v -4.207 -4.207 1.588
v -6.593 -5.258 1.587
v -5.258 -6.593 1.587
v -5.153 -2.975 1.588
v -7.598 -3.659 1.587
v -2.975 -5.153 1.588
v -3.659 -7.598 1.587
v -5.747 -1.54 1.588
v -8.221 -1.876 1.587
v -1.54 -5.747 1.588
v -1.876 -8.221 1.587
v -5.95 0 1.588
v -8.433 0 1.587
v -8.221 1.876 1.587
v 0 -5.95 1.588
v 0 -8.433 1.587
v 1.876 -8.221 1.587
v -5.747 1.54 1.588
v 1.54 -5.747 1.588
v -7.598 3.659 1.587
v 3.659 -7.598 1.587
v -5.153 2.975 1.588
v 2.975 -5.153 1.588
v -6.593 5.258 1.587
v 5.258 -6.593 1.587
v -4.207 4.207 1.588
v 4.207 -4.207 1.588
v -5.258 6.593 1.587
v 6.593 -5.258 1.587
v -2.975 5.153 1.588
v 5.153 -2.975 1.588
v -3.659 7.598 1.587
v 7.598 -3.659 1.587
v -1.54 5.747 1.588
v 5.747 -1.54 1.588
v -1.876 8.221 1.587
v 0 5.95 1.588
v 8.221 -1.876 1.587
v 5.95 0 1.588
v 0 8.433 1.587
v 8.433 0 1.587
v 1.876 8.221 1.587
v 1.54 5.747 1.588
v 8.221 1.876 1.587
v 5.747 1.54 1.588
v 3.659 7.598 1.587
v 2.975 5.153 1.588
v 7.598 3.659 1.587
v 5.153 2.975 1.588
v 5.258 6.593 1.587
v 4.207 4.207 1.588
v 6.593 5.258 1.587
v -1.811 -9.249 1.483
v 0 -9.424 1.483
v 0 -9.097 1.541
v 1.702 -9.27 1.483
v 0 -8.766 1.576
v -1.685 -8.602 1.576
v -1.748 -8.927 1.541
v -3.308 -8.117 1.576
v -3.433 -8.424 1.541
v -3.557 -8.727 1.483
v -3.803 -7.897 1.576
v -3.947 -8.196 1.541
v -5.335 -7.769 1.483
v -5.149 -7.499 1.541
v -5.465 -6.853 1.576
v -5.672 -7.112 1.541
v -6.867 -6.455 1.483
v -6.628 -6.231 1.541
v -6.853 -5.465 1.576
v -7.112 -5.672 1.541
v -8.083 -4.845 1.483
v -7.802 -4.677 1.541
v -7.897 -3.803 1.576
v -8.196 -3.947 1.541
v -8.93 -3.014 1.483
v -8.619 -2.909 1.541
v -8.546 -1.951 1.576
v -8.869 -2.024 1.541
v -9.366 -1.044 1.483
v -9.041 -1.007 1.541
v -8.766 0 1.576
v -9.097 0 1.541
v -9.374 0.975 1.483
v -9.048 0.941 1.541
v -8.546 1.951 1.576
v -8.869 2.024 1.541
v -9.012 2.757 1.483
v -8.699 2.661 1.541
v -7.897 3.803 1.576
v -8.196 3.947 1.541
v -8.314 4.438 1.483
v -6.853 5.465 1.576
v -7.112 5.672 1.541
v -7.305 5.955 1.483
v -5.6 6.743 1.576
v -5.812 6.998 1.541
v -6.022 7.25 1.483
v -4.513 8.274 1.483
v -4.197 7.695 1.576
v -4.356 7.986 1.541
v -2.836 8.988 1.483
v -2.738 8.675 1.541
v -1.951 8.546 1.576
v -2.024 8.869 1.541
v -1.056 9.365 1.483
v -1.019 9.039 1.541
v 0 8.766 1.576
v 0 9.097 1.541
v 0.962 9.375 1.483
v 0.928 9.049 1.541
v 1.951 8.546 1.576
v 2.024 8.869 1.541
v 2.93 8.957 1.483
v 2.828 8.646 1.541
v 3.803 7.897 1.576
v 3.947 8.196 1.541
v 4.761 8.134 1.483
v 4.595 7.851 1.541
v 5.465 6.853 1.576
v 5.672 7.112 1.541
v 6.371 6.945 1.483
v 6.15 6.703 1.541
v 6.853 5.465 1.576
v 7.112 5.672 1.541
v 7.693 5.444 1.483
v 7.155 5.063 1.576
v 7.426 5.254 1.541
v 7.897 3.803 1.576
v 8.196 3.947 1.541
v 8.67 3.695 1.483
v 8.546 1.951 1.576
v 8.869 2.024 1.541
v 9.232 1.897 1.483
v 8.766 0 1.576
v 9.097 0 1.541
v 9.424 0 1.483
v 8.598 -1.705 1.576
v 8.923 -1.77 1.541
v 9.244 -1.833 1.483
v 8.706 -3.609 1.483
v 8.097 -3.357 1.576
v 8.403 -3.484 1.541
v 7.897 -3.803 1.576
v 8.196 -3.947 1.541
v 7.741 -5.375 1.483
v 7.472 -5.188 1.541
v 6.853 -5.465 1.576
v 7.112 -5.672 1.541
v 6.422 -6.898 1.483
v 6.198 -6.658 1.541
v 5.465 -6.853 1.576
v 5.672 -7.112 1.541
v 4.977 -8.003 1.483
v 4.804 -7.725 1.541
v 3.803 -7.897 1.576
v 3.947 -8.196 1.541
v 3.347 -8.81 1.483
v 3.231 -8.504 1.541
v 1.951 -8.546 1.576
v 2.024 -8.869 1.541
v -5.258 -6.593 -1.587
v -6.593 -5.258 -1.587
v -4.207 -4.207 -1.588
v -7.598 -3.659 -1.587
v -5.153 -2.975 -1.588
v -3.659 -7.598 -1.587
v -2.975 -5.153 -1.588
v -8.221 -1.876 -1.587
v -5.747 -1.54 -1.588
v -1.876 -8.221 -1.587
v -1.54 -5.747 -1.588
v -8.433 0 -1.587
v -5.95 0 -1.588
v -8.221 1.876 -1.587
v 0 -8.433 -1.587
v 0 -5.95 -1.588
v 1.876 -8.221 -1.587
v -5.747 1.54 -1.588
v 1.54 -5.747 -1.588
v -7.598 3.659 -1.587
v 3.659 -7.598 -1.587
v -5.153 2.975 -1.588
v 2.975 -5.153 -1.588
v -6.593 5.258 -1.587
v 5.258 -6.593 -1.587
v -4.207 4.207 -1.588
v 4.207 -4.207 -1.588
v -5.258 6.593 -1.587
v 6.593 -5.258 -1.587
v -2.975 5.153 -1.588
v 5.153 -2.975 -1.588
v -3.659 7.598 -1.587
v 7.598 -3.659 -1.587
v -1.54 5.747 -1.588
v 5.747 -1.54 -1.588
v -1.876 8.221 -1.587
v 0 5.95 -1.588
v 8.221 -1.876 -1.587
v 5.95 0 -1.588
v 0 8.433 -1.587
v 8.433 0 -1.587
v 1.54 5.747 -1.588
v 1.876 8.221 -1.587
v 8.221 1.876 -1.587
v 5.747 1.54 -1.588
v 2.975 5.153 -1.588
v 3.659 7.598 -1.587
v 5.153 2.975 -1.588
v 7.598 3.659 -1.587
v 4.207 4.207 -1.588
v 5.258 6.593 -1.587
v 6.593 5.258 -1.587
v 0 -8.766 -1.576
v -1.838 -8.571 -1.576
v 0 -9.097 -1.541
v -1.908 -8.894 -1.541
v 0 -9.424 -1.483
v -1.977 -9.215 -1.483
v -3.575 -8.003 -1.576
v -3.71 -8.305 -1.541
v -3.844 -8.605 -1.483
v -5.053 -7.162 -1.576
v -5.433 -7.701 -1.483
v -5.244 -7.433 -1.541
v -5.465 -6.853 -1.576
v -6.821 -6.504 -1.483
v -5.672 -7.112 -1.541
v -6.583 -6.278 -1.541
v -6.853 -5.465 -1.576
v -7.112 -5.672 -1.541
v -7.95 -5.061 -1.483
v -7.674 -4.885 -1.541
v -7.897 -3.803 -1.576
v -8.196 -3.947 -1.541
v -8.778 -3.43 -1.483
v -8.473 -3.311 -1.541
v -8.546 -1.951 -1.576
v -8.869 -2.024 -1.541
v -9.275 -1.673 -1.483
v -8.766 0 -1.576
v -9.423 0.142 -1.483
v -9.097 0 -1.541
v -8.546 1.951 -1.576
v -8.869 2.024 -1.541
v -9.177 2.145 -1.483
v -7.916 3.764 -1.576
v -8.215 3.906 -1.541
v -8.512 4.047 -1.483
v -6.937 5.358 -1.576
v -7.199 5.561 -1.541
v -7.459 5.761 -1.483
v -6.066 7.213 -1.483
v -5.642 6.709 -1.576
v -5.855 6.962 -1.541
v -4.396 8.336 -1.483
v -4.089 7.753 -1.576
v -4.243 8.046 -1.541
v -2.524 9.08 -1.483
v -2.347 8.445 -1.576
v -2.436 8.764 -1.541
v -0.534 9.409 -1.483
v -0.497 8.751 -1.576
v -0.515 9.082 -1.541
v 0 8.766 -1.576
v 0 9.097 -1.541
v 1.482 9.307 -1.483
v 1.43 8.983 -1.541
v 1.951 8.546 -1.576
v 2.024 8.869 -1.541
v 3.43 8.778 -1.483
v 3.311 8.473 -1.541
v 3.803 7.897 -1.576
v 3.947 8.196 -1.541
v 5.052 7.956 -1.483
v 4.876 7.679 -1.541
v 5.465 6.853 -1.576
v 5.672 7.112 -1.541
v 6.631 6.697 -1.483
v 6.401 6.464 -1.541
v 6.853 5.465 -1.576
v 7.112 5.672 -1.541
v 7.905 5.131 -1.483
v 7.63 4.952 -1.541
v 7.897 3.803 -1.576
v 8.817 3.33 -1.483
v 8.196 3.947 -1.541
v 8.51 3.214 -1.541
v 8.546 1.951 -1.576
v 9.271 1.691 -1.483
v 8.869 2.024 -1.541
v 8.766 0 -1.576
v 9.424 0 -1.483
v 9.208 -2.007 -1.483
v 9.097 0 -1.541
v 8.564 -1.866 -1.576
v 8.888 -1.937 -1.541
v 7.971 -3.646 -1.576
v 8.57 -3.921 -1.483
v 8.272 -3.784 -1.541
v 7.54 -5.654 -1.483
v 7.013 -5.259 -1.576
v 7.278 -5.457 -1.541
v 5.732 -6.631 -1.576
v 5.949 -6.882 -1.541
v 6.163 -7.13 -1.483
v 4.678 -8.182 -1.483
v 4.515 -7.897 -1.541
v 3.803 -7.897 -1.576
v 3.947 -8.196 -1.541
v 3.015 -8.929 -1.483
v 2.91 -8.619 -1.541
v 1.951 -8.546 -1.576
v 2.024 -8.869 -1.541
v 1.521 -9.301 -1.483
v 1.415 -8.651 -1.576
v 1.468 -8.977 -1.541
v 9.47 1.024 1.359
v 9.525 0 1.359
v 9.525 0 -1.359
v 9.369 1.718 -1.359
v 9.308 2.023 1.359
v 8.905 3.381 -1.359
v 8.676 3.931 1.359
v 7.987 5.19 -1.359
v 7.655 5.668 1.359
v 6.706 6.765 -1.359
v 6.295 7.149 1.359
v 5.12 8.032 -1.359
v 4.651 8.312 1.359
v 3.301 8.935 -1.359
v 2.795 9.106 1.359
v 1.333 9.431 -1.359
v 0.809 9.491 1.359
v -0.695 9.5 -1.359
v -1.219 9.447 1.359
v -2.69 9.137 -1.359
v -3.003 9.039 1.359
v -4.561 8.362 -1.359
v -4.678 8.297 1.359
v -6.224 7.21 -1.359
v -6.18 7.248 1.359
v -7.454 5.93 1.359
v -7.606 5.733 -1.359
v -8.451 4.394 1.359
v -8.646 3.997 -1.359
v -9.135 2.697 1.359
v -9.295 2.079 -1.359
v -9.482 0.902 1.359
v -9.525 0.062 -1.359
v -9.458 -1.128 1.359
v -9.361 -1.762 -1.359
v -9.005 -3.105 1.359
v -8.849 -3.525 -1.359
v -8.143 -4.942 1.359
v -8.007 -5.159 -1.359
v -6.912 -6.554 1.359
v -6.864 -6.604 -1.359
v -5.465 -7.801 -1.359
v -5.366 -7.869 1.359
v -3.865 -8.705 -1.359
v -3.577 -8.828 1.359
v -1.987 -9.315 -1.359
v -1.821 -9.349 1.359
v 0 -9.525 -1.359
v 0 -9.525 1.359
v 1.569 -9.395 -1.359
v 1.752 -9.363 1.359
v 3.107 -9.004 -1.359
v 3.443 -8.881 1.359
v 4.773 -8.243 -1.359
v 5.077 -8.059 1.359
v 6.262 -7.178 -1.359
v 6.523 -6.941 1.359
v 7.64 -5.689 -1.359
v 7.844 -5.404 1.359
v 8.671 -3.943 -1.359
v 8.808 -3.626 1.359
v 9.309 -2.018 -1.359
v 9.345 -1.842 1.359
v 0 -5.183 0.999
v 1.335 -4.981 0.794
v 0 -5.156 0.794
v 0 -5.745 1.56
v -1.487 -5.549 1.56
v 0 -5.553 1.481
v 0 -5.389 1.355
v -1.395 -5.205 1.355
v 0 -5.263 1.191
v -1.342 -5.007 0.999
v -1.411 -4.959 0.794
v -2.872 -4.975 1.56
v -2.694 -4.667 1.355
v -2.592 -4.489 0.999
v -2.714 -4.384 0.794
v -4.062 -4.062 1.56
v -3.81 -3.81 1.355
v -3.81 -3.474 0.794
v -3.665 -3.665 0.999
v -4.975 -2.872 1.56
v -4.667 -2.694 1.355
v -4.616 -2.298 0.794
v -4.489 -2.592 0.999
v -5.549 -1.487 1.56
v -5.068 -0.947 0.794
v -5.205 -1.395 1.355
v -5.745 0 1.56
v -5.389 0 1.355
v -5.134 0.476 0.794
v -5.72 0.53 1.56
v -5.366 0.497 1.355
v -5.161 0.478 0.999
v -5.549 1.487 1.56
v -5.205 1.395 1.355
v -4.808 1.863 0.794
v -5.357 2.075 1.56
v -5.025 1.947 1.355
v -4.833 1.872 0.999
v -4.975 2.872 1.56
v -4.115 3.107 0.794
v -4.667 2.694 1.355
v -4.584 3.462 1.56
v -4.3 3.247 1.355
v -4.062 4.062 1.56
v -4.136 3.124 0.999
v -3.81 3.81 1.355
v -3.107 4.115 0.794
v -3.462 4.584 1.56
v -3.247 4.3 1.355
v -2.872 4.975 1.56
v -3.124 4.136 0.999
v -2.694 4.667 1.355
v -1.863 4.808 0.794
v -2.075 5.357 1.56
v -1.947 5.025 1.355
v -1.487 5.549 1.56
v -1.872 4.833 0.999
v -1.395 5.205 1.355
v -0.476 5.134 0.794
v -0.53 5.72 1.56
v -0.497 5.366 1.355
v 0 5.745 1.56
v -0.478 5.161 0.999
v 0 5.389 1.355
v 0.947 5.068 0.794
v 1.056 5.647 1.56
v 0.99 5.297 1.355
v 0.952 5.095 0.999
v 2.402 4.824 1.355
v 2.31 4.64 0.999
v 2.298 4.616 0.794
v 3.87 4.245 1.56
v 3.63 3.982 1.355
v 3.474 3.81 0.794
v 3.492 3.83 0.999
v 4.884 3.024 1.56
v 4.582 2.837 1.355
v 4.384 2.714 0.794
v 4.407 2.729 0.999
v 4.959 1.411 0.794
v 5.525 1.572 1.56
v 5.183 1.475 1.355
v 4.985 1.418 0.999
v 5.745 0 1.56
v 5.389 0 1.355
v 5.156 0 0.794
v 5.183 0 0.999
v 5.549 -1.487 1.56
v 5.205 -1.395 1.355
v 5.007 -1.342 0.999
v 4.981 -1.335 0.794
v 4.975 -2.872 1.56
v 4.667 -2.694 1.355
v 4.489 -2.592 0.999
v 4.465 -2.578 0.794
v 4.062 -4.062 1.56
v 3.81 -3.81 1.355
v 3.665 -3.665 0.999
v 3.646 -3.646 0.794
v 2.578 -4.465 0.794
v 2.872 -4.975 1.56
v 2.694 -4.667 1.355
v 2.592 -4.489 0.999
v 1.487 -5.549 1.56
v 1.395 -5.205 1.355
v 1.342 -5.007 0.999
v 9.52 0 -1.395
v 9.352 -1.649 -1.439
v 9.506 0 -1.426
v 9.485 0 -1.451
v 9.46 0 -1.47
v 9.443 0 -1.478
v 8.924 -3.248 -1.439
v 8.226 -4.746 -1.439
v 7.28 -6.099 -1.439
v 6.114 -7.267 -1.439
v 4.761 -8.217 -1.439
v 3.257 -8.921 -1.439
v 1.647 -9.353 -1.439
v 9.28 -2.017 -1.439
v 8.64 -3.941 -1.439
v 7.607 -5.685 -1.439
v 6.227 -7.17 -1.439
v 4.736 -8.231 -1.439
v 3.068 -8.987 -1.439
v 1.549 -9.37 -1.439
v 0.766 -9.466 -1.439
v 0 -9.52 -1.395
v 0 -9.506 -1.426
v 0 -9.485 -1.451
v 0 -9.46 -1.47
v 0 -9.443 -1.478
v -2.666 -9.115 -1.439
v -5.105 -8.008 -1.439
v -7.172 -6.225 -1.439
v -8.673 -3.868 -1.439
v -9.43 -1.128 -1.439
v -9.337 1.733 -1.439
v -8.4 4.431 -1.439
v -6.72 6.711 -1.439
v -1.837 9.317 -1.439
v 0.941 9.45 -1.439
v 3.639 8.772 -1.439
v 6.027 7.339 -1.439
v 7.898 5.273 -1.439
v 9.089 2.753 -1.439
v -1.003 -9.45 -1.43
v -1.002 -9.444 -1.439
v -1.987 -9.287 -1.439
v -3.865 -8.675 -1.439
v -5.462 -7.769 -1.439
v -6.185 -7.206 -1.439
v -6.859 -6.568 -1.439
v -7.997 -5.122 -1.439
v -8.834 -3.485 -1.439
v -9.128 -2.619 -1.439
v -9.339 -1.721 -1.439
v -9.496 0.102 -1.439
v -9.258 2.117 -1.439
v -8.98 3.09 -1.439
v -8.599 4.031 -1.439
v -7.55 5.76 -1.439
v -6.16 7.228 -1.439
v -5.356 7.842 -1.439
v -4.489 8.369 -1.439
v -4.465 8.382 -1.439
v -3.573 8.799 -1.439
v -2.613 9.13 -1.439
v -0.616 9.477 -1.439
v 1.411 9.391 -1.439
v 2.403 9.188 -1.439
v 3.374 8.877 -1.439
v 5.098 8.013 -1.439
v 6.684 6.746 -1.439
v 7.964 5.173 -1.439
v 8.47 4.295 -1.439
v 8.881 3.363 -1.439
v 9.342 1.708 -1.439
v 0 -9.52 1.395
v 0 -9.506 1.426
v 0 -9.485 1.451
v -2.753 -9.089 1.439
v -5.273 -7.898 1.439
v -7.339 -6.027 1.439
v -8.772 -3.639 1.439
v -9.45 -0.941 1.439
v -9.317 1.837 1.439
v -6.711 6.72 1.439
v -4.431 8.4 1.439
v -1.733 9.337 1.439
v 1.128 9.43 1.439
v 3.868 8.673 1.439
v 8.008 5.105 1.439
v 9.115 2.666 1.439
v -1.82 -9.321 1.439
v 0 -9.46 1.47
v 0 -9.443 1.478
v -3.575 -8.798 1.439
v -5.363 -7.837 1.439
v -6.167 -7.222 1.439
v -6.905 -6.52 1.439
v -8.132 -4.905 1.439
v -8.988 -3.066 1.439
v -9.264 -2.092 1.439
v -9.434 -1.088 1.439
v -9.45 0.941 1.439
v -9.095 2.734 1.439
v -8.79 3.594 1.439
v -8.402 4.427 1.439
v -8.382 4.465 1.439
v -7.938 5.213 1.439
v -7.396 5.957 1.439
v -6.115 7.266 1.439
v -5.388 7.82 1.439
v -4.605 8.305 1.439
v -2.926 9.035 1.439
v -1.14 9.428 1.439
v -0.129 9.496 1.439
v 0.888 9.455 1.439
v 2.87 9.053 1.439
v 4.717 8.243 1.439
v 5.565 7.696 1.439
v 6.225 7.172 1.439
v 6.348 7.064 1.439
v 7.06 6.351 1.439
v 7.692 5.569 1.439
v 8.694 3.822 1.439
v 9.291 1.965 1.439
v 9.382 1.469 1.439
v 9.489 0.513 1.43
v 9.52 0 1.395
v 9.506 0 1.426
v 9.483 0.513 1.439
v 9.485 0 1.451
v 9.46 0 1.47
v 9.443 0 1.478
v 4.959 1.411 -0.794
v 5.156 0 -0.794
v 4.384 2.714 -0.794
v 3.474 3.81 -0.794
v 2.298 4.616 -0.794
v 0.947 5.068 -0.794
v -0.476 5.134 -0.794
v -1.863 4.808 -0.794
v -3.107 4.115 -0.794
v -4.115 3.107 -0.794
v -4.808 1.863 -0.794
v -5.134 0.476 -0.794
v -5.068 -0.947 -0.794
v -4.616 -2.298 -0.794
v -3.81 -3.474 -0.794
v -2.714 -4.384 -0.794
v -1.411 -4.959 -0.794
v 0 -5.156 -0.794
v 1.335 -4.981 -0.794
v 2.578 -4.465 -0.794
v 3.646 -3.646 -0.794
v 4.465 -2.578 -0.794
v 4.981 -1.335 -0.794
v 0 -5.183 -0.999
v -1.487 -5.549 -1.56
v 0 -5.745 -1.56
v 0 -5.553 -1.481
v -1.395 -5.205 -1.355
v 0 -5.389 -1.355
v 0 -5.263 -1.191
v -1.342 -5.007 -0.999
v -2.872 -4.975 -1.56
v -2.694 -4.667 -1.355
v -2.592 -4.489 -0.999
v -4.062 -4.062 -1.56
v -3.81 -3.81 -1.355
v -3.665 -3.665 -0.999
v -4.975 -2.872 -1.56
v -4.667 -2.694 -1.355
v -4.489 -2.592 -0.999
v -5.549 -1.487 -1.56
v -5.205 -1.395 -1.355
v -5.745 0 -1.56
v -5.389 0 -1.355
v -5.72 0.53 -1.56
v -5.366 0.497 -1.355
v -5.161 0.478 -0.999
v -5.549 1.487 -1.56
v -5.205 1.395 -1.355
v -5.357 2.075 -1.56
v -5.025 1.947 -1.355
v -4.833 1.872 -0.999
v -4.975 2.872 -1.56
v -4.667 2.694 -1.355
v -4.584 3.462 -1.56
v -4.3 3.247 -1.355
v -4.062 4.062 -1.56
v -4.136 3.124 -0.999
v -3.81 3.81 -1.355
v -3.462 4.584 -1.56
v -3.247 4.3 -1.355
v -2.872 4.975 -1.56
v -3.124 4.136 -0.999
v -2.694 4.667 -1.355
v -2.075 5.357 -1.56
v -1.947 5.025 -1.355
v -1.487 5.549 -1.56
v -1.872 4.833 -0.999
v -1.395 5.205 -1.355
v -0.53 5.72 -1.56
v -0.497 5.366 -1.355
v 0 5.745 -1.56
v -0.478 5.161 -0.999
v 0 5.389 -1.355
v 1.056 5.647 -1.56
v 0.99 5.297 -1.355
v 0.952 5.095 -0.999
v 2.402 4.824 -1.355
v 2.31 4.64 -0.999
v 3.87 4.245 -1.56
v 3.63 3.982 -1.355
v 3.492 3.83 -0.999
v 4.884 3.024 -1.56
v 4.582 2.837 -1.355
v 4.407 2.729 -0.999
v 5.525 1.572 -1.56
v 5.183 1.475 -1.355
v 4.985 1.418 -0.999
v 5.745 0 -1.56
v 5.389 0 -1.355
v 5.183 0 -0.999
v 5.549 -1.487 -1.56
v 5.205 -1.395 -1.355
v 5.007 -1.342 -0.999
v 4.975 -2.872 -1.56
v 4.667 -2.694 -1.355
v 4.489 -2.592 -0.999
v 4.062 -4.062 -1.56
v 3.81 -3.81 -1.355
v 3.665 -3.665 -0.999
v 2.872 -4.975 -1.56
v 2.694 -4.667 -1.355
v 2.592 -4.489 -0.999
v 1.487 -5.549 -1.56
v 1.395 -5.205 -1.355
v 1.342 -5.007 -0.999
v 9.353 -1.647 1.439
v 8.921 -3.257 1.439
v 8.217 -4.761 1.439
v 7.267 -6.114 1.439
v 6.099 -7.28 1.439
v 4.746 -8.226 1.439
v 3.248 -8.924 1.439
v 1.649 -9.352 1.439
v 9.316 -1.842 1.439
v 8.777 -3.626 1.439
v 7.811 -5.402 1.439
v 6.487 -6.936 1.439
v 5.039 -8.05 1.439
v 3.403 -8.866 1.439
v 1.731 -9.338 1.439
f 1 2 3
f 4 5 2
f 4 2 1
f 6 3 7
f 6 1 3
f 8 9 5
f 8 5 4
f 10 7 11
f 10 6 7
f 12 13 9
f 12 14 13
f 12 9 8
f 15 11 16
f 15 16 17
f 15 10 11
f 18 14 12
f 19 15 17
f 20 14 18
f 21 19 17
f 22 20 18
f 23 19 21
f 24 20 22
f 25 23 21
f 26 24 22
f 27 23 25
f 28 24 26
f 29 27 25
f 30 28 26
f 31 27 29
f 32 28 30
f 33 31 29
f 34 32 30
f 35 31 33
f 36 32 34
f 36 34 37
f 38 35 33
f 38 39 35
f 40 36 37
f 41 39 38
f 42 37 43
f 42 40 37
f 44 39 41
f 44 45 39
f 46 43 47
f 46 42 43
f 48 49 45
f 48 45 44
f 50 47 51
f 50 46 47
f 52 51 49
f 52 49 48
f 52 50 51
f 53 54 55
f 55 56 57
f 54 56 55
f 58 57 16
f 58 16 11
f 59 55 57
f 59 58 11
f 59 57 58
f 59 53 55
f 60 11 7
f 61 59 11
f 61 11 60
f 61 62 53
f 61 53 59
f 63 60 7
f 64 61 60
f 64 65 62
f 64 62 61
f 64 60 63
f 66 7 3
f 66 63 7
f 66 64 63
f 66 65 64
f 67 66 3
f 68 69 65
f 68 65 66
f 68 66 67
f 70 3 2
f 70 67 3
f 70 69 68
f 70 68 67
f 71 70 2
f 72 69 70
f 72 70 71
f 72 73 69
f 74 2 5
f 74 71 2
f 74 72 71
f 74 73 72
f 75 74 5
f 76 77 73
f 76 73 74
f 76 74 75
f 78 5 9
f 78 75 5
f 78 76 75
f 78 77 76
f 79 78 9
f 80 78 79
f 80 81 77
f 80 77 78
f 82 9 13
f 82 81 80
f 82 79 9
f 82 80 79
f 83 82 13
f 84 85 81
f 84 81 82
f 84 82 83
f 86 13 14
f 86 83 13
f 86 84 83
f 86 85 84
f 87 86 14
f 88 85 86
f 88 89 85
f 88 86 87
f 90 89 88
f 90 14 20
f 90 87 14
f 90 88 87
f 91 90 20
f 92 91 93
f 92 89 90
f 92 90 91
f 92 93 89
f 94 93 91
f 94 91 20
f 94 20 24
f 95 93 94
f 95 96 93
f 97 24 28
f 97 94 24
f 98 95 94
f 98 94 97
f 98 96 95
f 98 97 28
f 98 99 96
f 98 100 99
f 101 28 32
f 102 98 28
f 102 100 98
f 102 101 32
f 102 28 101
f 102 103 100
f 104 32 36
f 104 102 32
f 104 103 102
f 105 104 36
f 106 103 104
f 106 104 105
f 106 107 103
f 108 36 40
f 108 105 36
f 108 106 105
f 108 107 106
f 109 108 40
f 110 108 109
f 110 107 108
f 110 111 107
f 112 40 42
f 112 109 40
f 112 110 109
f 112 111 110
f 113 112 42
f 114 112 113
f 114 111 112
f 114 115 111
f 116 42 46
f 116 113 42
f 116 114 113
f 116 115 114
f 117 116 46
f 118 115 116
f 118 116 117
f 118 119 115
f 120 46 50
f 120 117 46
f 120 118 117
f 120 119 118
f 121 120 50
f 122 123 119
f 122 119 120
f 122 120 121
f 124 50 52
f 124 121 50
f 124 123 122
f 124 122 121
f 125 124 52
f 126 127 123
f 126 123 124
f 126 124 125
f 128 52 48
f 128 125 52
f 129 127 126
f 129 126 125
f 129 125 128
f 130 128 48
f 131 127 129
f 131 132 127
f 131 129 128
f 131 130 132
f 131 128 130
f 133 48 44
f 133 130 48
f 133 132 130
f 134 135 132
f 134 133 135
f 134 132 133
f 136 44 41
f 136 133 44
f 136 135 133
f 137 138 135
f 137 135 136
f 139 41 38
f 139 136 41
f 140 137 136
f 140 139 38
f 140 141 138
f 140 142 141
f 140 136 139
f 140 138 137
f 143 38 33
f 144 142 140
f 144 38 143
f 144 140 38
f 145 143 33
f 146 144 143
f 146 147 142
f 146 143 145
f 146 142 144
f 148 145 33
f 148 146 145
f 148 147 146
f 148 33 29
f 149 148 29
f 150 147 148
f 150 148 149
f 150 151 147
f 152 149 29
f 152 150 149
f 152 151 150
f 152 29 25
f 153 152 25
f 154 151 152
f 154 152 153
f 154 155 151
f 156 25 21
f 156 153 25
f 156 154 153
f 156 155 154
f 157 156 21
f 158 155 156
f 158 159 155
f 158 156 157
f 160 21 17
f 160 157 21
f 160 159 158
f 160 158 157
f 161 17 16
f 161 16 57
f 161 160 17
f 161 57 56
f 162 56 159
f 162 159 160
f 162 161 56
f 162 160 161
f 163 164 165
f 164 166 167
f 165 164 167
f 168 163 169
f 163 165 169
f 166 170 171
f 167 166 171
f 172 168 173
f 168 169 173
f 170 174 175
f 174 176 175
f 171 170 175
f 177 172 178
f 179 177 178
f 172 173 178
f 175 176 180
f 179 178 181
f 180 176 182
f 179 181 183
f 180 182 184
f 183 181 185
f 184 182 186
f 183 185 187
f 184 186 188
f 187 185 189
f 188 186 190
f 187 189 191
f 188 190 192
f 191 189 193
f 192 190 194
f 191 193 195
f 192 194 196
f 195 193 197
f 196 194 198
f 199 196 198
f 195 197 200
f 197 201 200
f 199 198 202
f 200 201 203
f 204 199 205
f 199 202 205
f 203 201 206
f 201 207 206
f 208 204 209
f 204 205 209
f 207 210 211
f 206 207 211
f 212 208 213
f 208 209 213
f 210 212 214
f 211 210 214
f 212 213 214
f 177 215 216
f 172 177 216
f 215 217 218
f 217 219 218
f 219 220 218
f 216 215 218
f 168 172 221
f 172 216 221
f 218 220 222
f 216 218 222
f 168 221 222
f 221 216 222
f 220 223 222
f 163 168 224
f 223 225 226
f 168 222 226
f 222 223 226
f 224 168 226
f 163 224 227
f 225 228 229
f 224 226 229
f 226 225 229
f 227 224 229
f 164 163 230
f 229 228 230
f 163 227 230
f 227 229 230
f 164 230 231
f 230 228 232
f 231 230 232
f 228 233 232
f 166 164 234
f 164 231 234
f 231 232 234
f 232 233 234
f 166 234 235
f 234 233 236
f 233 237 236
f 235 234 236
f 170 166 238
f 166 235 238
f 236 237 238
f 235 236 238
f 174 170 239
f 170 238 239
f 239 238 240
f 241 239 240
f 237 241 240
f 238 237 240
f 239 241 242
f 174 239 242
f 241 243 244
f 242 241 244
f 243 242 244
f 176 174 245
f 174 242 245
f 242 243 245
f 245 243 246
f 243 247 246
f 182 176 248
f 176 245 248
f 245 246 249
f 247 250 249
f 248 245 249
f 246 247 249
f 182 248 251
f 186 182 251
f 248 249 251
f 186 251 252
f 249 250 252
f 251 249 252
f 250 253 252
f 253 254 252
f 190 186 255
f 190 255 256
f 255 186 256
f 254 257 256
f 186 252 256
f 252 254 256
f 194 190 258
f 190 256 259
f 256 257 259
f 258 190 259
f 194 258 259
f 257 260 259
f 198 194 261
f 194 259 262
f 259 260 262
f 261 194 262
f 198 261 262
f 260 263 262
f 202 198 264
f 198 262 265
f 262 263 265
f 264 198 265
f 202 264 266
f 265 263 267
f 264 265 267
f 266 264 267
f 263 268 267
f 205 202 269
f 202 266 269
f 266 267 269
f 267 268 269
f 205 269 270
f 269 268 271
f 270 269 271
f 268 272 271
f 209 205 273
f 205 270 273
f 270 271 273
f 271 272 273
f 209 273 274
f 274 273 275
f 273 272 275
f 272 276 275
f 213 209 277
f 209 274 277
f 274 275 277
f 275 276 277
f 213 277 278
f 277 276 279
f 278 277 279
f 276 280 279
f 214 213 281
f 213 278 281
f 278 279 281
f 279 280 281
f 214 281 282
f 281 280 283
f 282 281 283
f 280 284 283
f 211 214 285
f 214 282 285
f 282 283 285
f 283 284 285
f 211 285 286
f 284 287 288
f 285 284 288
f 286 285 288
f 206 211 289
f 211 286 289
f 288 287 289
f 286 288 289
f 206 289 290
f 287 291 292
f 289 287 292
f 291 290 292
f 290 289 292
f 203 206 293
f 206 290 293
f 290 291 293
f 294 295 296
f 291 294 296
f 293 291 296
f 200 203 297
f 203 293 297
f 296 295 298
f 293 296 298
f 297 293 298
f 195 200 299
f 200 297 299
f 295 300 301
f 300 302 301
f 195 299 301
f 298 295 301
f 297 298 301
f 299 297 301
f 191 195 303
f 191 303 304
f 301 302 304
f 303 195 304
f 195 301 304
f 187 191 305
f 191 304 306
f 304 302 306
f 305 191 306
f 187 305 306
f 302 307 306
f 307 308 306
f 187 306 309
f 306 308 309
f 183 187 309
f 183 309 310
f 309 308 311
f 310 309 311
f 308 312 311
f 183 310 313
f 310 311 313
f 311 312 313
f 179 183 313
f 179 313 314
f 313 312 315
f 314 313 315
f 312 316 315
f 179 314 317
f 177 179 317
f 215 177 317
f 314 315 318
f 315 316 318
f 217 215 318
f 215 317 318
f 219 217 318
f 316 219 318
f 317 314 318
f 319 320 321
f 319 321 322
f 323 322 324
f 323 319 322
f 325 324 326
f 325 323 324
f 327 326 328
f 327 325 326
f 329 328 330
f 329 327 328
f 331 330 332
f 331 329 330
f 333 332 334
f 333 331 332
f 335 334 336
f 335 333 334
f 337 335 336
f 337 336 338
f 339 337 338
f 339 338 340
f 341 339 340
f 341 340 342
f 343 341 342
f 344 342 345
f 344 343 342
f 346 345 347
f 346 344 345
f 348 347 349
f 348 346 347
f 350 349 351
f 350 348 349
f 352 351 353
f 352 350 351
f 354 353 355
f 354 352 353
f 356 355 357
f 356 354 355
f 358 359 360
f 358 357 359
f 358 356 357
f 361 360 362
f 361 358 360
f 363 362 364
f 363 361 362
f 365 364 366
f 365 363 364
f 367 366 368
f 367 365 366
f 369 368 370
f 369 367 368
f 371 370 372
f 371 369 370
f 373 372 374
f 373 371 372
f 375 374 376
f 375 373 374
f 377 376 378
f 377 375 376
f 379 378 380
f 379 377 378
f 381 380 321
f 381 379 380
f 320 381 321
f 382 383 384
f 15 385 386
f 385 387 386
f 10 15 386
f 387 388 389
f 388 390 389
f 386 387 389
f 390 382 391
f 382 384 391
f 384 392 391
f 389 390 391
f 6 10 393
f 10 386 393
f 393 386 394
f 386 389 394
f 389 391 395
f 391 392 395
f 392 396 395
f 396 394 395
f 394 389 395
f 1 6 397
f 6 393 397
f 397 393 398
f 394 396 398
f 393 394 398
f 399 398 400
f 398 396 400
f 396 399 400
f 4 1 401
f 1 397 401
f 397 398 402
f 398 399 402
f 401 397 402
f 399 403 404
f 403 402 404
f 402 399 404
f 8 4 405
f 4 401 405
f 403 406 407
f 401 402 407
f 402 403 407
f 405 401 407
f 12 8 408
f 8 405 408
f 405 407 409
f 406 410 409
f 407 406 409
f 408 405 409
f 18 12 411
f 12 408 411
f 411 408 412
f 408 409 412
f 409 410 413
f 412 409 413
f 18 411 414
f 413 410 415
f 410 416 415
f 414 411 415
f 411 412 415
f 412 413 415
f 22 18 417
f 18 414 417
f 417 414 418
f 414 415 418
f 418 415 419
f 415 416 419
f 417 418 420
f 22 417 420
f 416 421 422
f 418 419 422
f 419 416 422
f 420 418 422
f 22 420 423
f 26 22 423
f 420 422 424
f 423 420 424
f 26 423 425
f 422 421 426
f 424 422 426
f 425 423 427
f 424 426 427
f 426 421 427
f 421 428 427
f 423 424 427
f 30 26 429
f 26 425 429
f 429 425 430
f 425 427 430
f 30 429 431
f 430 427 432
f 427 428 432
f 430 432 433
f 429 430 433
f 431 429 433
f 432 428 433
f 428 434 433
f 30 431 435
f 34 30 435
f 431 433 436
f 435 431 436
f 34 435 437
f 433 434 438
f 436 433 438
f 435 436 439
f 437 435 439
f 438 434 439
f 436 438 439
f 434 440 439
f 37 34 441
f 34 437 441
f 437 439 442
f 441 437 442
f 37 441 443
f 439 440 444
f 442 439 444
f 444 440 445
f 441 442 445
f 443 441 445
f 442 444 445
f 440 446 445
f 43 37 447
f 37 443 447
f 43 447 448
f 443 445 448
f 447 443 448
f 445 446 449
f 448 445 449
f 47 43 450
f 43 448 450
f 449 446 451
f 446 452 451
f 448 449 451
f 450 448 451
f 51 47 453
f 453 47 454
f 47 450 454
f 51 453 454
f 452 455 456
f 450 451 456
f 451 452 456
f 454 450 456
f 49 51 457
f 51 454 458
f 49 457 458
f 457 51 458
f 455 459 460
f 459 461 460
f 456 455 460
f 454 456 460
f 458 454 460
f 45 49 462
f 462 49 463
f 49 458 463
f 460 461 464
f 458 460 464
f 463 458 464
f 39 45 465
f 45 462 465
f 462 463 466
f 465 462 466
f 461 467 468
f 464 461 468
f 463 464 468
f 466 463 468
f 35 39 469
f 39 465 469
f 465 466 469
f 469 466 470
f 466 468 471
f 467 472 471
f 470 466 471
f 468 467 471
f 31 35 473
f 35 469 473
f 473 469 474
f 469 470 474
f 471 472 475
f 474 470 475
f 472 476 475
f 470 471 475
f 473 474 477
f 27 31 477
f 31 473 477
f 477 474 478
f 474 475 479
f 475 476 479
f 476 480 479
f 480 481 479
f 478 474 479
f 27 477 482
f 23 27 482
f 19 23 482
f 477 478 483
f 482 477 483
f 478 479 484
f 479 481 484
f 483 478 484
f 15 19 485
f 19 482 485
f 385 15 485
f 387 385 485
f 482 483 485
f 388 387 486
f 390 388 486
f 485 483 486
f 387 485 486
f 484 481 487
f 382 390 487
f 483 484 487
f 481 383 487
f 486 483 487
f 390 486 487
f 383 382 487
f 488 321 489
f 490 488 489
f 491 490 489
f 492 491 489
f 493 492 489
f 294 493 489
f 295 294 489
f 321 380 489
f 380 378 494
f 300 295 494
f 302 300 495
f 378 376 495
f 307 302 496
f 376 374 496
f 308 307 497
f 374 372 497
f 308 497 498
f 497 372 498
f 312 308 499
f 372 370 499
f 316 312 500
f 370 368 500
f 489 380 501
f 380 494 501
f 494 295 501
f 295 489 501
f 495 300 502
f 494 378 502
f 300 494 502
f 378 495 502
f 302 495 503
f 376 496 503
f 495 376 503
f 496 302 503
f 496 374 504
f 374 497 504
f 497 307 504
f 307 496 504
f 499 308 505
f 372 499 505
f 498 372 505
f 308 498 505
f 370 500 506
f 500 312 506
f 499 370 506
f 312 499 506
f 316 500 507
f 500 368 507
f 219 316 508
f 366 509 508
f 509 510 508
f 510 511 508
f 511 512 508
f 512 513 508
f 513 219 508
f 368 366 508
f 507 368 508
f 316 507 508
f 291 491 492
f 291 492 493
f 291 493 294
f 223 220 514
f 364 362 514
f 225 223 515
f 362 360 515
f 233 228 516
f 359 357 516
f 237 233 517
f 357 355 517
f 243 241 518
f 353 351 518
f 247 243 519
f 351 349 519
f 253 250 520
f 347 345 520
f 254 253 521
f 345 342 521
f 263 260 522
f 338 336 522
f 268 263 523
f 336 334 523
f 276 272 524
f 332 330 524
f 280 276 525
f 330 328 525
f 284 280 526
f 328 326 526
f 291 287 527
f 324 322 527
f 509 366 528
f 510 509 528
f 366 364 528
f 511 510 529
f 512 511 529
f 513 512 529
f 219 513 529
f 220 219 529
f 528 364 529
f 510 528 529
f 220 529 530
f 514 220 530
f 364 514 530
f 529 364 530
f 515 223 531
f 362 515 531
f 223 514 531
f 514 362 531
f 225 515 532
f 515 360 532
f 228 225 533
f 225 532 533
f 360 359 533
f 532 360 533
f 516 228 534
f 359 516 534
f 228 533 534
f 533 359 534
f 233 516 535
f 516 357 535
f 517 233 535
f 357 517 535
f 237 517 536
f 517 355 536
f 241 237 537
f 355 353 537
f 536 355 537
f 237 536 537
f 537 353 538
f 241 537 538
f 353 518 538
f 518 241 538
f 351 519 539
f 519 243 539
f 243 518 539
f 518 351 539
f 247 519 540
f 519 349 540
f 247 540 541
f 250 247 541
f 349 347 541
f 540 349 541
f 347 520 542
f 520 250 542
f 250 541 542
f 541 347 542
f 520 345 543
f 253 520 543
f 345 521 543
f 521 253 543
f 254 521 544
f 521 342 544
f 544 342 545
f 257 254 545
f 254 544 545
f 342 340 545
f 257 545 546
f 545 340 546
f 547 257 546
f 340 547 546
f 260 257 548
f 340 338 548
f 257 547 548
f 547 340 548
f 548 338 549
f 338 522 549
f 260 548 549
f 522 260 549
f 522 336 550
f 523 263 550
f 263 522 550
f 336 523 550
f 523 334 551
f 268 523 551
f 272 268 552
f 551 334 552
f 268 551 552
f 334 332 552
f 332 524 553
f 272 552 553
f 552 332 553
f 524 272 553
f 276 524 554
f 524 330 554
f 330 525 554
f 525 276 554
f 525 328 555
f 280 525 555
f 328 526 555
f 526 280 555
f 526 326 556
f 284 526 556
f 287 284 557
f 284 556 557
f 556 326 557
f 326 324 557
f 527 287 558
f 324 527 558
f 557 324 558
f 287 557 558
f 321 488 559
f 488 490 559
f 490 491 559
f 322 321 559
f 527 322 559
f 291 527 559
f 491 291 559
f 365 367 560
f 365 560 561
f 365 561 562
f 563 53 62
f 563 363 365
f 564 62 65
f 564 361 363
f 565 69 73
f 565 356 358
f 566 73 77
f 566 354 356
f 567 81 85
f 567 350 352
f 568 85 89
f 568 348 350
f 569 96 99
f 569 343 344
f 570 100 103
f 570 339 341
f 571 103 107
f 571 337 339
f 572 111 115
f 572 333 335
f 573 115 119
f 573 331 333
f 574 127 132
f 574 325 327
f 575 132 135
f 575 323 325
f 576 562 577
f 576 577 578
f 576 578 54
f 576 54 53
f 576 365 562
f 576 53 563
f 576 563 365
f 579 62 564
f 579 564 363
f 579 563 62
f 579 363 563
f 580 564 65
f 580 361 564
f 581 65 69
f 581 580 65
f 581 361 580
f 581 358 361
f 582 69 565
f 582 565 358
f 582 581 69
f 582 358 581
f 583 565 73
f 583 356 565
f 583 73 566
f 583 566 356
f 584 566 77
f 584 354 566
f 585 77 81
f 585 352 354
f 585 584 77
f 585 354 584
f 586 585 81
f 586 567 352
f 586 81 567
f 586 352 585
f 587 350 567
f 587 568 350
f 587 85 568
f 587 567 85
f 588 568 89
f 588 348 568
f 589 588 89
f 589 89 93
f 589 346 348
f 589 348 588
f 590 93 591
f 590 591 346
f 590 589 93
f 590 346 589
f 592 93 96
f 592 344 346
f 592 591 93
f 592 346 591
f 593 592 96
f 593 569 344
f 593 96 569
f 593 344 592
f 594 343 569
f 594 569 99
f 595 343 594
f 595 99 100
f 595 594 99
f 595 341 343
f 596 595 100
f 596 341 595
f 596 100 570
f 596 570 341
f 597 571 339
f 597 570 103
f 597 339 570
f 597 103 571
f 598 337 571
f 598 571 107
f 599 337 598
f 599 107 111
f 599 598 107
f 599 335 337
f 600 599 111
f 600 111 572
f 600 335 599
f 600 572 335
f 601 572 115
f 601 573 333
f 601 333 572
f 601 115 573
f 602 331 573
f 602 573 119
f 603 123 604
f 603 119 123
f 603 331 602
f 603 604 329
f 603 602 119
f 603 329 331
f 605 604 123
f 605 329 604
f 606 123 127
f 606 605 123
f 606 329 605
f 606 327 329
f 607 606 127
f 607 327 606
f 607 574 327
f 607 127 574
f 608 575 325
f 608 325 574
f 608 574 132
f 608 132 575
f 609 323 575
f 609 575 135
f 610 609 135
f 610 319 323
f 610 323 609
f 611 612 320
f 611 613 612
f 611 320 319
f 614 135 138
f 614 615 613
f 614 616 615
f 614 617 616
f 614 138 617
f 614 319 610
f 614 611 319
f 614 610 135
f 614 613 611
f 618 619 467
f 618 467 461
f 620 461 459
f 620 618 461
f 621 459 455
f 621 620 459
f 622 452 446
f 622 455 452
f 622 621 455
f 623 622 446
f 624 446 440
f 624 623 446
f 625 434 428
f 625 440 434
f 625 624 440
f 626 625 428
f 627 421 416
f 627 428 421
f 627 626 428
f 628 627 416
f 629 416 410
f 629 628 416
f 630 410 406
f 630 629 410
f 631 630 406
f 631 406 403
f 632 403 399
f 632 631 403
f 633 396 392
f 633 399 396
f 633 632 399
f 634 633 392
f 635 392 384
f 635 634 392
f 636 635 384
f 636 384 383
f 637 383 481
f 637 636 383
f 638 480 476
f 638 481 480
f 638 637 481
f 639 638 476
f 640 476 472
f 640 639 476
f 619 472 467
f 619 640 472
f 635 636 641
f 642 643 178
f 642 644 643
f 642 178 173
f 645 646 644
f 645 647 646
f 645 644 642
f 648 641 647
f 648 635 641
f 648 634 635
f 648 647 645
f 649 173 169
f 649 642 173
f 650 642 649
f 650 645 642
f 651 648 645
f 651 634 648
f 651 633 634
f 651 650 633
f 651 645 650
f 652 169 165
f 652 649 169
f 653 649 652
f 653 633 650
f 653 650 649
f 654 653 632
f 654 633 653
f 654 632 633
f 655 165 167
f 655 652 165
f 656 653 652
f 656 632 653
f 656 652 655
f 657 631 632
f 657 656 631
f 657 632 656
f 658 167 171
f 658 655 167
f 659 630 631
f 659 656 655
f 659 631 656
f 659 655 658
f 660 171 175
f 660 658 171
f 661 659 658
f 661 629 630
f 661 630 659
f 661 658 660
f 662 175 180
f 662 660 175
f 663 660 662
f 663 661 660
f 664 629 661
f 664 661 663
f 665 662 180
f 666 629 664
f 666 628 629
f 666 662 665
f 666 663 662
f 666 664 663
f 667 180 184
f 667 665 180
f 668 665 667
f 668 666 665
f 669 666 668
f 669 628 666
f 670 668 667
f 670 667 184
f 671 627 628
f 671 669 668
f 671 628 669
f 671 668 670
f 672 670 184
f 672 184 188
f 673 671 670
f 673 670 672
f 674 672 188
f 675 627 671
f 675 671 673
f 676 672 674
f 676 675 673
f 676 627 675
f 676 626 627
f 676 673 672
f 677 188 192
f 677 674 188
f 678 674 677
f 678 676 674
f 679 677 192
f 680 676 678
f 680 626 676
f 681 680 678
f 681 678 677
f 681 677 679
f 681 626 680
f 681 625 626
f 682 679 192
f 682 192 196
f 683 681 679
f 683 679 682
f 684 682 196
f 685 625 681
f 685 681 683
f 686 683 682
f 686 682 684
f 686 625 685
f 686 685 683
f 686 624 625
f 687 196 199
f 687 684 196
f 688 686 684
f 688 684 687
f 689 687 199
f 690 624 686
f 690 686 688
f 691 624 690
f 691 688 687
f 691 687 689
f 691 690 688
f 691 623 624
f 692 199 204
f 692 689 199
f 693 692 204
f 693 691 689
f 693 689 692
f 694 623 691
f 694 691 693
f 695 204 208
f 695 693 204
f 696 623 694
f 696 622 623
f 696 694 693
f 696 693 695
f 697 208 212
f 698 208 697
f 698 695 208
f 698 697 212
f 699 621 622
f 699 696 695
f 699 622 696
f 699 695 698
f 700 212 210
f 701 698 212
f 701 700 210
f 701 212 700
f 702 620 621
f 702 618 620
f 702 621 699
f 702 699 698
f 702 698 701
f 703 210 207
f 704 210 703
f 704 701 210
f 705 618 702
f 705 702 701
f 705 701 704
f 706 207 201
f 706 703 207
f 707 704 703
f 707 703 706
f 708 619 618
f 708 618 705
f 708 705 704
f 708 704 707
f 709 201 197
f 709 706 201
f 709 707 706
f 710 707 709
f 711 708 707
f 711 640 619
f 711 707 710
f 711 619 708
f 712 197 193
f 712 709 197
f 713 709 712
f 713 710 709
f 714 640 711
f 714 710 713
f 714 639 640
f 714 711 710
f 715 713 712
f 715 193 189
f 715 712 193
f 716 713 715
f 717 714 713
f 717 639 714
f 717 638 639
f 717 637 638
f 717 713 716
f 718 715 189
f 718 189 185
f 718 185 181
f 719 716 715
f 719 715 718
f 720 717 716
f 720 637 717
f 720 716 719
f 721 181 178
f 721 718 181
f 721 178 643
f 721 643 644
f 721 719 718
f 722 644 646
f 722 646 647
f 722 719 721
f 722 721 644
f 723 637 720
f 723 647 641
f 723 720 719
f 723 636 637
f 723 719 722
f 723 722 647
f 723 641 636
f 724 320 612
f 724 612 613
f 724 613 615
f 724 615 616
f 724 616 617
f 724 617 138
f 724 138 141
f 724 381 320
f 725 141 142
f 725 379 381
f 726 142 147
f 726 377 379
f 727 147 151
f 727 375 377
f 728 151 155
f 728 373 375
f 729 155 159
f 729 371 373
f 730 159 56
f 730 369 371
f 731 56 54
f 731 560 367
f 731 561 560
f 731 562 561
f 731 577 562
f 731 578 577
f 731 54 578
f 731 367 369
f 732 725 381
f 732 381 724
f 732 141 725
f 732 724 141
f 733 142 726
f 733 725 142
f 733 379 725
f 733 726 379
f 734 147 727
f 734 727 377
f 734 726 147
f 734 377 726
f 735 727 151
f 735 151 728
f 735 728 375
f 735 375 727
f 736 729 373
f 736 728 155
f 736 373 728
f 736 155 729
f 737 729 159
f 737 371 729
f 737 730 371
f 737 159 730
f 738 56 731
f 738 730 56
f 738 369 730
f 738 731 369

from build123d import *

# Parameters (mm, degrees)
SKETCH3_R           = 9.525
SKETCH3_R_2         = 5.1562
BOSS_EXTRUDE1_DEPTH = 1.5875
FILLET1_R           = 0.127


with BuildPart() as part:
    # Sketch3 → Boss-Extrude1 (new, symmetric)
    with BuildSketch(Plane.XY):
        Circle(SKETCH3_R)
        Circle(SKETCH3_R_2, mode=Mode.SUBTRACT)
    extrude(amount=BOSS_EXTRUDE1_DEPTH, both=True)

    # Sketch4 → Cut-Revolve1 (revolve, cut)
    with BuildSketch(Plane(origin=(0, 0, 0), x_dir=(0, 0, -1), z_dir=(1, 0, 0)), mode=Mode.PRIVATE) as cut_revolve1_sk:
        with BuildLine():
            Line((-1.4605, 9.525), (-1.5875, 9.525))
            Line((-1.5875, 9.525), (-1.5875, 8.4328))
            ThreePointArc((-1.5875, 8.4328), (-1.555643398, 8.982579465), (-1.4605, 9.525))
        make_face()
        with BuildLine():
            Line((-0.79375, 5.1562), (-1.5875, 5.1562))
            Line((-1.5875, 5.1562), (-1.5875, 5.94995))
            ThreePointArc((-1.5875, 5.94995), (-1.355016008, 5.388683992), (-0.79375, 5.1562))
        make_face()
    cut_revolve1 = revolve(cut_revolve1_sk.sketch.rotate(Axis((0, 0, 1.5875), (0, 0, -1)), 180), axis=Axis((0, 0, 1.5875), (0, 0, -1)), mode=Mode.SUBTRACT)

    # Mirror1: Cut-Revolve1 across plane
    add(cut_revolve1.mirror(Plane.XY), mode=Mode.SUBTRACT)

    # Fillet1
    fillet1_edges = [part.edges().sort_by_distance(p)[0] for p in [
        (-6.735192091, 6.735192091, 1.4605),
        (6.735192091, -6.735192091, -1.4605),
    ]]
    fillet(fillet1_edges, radius=FILLET1_R)


solid = part.part
